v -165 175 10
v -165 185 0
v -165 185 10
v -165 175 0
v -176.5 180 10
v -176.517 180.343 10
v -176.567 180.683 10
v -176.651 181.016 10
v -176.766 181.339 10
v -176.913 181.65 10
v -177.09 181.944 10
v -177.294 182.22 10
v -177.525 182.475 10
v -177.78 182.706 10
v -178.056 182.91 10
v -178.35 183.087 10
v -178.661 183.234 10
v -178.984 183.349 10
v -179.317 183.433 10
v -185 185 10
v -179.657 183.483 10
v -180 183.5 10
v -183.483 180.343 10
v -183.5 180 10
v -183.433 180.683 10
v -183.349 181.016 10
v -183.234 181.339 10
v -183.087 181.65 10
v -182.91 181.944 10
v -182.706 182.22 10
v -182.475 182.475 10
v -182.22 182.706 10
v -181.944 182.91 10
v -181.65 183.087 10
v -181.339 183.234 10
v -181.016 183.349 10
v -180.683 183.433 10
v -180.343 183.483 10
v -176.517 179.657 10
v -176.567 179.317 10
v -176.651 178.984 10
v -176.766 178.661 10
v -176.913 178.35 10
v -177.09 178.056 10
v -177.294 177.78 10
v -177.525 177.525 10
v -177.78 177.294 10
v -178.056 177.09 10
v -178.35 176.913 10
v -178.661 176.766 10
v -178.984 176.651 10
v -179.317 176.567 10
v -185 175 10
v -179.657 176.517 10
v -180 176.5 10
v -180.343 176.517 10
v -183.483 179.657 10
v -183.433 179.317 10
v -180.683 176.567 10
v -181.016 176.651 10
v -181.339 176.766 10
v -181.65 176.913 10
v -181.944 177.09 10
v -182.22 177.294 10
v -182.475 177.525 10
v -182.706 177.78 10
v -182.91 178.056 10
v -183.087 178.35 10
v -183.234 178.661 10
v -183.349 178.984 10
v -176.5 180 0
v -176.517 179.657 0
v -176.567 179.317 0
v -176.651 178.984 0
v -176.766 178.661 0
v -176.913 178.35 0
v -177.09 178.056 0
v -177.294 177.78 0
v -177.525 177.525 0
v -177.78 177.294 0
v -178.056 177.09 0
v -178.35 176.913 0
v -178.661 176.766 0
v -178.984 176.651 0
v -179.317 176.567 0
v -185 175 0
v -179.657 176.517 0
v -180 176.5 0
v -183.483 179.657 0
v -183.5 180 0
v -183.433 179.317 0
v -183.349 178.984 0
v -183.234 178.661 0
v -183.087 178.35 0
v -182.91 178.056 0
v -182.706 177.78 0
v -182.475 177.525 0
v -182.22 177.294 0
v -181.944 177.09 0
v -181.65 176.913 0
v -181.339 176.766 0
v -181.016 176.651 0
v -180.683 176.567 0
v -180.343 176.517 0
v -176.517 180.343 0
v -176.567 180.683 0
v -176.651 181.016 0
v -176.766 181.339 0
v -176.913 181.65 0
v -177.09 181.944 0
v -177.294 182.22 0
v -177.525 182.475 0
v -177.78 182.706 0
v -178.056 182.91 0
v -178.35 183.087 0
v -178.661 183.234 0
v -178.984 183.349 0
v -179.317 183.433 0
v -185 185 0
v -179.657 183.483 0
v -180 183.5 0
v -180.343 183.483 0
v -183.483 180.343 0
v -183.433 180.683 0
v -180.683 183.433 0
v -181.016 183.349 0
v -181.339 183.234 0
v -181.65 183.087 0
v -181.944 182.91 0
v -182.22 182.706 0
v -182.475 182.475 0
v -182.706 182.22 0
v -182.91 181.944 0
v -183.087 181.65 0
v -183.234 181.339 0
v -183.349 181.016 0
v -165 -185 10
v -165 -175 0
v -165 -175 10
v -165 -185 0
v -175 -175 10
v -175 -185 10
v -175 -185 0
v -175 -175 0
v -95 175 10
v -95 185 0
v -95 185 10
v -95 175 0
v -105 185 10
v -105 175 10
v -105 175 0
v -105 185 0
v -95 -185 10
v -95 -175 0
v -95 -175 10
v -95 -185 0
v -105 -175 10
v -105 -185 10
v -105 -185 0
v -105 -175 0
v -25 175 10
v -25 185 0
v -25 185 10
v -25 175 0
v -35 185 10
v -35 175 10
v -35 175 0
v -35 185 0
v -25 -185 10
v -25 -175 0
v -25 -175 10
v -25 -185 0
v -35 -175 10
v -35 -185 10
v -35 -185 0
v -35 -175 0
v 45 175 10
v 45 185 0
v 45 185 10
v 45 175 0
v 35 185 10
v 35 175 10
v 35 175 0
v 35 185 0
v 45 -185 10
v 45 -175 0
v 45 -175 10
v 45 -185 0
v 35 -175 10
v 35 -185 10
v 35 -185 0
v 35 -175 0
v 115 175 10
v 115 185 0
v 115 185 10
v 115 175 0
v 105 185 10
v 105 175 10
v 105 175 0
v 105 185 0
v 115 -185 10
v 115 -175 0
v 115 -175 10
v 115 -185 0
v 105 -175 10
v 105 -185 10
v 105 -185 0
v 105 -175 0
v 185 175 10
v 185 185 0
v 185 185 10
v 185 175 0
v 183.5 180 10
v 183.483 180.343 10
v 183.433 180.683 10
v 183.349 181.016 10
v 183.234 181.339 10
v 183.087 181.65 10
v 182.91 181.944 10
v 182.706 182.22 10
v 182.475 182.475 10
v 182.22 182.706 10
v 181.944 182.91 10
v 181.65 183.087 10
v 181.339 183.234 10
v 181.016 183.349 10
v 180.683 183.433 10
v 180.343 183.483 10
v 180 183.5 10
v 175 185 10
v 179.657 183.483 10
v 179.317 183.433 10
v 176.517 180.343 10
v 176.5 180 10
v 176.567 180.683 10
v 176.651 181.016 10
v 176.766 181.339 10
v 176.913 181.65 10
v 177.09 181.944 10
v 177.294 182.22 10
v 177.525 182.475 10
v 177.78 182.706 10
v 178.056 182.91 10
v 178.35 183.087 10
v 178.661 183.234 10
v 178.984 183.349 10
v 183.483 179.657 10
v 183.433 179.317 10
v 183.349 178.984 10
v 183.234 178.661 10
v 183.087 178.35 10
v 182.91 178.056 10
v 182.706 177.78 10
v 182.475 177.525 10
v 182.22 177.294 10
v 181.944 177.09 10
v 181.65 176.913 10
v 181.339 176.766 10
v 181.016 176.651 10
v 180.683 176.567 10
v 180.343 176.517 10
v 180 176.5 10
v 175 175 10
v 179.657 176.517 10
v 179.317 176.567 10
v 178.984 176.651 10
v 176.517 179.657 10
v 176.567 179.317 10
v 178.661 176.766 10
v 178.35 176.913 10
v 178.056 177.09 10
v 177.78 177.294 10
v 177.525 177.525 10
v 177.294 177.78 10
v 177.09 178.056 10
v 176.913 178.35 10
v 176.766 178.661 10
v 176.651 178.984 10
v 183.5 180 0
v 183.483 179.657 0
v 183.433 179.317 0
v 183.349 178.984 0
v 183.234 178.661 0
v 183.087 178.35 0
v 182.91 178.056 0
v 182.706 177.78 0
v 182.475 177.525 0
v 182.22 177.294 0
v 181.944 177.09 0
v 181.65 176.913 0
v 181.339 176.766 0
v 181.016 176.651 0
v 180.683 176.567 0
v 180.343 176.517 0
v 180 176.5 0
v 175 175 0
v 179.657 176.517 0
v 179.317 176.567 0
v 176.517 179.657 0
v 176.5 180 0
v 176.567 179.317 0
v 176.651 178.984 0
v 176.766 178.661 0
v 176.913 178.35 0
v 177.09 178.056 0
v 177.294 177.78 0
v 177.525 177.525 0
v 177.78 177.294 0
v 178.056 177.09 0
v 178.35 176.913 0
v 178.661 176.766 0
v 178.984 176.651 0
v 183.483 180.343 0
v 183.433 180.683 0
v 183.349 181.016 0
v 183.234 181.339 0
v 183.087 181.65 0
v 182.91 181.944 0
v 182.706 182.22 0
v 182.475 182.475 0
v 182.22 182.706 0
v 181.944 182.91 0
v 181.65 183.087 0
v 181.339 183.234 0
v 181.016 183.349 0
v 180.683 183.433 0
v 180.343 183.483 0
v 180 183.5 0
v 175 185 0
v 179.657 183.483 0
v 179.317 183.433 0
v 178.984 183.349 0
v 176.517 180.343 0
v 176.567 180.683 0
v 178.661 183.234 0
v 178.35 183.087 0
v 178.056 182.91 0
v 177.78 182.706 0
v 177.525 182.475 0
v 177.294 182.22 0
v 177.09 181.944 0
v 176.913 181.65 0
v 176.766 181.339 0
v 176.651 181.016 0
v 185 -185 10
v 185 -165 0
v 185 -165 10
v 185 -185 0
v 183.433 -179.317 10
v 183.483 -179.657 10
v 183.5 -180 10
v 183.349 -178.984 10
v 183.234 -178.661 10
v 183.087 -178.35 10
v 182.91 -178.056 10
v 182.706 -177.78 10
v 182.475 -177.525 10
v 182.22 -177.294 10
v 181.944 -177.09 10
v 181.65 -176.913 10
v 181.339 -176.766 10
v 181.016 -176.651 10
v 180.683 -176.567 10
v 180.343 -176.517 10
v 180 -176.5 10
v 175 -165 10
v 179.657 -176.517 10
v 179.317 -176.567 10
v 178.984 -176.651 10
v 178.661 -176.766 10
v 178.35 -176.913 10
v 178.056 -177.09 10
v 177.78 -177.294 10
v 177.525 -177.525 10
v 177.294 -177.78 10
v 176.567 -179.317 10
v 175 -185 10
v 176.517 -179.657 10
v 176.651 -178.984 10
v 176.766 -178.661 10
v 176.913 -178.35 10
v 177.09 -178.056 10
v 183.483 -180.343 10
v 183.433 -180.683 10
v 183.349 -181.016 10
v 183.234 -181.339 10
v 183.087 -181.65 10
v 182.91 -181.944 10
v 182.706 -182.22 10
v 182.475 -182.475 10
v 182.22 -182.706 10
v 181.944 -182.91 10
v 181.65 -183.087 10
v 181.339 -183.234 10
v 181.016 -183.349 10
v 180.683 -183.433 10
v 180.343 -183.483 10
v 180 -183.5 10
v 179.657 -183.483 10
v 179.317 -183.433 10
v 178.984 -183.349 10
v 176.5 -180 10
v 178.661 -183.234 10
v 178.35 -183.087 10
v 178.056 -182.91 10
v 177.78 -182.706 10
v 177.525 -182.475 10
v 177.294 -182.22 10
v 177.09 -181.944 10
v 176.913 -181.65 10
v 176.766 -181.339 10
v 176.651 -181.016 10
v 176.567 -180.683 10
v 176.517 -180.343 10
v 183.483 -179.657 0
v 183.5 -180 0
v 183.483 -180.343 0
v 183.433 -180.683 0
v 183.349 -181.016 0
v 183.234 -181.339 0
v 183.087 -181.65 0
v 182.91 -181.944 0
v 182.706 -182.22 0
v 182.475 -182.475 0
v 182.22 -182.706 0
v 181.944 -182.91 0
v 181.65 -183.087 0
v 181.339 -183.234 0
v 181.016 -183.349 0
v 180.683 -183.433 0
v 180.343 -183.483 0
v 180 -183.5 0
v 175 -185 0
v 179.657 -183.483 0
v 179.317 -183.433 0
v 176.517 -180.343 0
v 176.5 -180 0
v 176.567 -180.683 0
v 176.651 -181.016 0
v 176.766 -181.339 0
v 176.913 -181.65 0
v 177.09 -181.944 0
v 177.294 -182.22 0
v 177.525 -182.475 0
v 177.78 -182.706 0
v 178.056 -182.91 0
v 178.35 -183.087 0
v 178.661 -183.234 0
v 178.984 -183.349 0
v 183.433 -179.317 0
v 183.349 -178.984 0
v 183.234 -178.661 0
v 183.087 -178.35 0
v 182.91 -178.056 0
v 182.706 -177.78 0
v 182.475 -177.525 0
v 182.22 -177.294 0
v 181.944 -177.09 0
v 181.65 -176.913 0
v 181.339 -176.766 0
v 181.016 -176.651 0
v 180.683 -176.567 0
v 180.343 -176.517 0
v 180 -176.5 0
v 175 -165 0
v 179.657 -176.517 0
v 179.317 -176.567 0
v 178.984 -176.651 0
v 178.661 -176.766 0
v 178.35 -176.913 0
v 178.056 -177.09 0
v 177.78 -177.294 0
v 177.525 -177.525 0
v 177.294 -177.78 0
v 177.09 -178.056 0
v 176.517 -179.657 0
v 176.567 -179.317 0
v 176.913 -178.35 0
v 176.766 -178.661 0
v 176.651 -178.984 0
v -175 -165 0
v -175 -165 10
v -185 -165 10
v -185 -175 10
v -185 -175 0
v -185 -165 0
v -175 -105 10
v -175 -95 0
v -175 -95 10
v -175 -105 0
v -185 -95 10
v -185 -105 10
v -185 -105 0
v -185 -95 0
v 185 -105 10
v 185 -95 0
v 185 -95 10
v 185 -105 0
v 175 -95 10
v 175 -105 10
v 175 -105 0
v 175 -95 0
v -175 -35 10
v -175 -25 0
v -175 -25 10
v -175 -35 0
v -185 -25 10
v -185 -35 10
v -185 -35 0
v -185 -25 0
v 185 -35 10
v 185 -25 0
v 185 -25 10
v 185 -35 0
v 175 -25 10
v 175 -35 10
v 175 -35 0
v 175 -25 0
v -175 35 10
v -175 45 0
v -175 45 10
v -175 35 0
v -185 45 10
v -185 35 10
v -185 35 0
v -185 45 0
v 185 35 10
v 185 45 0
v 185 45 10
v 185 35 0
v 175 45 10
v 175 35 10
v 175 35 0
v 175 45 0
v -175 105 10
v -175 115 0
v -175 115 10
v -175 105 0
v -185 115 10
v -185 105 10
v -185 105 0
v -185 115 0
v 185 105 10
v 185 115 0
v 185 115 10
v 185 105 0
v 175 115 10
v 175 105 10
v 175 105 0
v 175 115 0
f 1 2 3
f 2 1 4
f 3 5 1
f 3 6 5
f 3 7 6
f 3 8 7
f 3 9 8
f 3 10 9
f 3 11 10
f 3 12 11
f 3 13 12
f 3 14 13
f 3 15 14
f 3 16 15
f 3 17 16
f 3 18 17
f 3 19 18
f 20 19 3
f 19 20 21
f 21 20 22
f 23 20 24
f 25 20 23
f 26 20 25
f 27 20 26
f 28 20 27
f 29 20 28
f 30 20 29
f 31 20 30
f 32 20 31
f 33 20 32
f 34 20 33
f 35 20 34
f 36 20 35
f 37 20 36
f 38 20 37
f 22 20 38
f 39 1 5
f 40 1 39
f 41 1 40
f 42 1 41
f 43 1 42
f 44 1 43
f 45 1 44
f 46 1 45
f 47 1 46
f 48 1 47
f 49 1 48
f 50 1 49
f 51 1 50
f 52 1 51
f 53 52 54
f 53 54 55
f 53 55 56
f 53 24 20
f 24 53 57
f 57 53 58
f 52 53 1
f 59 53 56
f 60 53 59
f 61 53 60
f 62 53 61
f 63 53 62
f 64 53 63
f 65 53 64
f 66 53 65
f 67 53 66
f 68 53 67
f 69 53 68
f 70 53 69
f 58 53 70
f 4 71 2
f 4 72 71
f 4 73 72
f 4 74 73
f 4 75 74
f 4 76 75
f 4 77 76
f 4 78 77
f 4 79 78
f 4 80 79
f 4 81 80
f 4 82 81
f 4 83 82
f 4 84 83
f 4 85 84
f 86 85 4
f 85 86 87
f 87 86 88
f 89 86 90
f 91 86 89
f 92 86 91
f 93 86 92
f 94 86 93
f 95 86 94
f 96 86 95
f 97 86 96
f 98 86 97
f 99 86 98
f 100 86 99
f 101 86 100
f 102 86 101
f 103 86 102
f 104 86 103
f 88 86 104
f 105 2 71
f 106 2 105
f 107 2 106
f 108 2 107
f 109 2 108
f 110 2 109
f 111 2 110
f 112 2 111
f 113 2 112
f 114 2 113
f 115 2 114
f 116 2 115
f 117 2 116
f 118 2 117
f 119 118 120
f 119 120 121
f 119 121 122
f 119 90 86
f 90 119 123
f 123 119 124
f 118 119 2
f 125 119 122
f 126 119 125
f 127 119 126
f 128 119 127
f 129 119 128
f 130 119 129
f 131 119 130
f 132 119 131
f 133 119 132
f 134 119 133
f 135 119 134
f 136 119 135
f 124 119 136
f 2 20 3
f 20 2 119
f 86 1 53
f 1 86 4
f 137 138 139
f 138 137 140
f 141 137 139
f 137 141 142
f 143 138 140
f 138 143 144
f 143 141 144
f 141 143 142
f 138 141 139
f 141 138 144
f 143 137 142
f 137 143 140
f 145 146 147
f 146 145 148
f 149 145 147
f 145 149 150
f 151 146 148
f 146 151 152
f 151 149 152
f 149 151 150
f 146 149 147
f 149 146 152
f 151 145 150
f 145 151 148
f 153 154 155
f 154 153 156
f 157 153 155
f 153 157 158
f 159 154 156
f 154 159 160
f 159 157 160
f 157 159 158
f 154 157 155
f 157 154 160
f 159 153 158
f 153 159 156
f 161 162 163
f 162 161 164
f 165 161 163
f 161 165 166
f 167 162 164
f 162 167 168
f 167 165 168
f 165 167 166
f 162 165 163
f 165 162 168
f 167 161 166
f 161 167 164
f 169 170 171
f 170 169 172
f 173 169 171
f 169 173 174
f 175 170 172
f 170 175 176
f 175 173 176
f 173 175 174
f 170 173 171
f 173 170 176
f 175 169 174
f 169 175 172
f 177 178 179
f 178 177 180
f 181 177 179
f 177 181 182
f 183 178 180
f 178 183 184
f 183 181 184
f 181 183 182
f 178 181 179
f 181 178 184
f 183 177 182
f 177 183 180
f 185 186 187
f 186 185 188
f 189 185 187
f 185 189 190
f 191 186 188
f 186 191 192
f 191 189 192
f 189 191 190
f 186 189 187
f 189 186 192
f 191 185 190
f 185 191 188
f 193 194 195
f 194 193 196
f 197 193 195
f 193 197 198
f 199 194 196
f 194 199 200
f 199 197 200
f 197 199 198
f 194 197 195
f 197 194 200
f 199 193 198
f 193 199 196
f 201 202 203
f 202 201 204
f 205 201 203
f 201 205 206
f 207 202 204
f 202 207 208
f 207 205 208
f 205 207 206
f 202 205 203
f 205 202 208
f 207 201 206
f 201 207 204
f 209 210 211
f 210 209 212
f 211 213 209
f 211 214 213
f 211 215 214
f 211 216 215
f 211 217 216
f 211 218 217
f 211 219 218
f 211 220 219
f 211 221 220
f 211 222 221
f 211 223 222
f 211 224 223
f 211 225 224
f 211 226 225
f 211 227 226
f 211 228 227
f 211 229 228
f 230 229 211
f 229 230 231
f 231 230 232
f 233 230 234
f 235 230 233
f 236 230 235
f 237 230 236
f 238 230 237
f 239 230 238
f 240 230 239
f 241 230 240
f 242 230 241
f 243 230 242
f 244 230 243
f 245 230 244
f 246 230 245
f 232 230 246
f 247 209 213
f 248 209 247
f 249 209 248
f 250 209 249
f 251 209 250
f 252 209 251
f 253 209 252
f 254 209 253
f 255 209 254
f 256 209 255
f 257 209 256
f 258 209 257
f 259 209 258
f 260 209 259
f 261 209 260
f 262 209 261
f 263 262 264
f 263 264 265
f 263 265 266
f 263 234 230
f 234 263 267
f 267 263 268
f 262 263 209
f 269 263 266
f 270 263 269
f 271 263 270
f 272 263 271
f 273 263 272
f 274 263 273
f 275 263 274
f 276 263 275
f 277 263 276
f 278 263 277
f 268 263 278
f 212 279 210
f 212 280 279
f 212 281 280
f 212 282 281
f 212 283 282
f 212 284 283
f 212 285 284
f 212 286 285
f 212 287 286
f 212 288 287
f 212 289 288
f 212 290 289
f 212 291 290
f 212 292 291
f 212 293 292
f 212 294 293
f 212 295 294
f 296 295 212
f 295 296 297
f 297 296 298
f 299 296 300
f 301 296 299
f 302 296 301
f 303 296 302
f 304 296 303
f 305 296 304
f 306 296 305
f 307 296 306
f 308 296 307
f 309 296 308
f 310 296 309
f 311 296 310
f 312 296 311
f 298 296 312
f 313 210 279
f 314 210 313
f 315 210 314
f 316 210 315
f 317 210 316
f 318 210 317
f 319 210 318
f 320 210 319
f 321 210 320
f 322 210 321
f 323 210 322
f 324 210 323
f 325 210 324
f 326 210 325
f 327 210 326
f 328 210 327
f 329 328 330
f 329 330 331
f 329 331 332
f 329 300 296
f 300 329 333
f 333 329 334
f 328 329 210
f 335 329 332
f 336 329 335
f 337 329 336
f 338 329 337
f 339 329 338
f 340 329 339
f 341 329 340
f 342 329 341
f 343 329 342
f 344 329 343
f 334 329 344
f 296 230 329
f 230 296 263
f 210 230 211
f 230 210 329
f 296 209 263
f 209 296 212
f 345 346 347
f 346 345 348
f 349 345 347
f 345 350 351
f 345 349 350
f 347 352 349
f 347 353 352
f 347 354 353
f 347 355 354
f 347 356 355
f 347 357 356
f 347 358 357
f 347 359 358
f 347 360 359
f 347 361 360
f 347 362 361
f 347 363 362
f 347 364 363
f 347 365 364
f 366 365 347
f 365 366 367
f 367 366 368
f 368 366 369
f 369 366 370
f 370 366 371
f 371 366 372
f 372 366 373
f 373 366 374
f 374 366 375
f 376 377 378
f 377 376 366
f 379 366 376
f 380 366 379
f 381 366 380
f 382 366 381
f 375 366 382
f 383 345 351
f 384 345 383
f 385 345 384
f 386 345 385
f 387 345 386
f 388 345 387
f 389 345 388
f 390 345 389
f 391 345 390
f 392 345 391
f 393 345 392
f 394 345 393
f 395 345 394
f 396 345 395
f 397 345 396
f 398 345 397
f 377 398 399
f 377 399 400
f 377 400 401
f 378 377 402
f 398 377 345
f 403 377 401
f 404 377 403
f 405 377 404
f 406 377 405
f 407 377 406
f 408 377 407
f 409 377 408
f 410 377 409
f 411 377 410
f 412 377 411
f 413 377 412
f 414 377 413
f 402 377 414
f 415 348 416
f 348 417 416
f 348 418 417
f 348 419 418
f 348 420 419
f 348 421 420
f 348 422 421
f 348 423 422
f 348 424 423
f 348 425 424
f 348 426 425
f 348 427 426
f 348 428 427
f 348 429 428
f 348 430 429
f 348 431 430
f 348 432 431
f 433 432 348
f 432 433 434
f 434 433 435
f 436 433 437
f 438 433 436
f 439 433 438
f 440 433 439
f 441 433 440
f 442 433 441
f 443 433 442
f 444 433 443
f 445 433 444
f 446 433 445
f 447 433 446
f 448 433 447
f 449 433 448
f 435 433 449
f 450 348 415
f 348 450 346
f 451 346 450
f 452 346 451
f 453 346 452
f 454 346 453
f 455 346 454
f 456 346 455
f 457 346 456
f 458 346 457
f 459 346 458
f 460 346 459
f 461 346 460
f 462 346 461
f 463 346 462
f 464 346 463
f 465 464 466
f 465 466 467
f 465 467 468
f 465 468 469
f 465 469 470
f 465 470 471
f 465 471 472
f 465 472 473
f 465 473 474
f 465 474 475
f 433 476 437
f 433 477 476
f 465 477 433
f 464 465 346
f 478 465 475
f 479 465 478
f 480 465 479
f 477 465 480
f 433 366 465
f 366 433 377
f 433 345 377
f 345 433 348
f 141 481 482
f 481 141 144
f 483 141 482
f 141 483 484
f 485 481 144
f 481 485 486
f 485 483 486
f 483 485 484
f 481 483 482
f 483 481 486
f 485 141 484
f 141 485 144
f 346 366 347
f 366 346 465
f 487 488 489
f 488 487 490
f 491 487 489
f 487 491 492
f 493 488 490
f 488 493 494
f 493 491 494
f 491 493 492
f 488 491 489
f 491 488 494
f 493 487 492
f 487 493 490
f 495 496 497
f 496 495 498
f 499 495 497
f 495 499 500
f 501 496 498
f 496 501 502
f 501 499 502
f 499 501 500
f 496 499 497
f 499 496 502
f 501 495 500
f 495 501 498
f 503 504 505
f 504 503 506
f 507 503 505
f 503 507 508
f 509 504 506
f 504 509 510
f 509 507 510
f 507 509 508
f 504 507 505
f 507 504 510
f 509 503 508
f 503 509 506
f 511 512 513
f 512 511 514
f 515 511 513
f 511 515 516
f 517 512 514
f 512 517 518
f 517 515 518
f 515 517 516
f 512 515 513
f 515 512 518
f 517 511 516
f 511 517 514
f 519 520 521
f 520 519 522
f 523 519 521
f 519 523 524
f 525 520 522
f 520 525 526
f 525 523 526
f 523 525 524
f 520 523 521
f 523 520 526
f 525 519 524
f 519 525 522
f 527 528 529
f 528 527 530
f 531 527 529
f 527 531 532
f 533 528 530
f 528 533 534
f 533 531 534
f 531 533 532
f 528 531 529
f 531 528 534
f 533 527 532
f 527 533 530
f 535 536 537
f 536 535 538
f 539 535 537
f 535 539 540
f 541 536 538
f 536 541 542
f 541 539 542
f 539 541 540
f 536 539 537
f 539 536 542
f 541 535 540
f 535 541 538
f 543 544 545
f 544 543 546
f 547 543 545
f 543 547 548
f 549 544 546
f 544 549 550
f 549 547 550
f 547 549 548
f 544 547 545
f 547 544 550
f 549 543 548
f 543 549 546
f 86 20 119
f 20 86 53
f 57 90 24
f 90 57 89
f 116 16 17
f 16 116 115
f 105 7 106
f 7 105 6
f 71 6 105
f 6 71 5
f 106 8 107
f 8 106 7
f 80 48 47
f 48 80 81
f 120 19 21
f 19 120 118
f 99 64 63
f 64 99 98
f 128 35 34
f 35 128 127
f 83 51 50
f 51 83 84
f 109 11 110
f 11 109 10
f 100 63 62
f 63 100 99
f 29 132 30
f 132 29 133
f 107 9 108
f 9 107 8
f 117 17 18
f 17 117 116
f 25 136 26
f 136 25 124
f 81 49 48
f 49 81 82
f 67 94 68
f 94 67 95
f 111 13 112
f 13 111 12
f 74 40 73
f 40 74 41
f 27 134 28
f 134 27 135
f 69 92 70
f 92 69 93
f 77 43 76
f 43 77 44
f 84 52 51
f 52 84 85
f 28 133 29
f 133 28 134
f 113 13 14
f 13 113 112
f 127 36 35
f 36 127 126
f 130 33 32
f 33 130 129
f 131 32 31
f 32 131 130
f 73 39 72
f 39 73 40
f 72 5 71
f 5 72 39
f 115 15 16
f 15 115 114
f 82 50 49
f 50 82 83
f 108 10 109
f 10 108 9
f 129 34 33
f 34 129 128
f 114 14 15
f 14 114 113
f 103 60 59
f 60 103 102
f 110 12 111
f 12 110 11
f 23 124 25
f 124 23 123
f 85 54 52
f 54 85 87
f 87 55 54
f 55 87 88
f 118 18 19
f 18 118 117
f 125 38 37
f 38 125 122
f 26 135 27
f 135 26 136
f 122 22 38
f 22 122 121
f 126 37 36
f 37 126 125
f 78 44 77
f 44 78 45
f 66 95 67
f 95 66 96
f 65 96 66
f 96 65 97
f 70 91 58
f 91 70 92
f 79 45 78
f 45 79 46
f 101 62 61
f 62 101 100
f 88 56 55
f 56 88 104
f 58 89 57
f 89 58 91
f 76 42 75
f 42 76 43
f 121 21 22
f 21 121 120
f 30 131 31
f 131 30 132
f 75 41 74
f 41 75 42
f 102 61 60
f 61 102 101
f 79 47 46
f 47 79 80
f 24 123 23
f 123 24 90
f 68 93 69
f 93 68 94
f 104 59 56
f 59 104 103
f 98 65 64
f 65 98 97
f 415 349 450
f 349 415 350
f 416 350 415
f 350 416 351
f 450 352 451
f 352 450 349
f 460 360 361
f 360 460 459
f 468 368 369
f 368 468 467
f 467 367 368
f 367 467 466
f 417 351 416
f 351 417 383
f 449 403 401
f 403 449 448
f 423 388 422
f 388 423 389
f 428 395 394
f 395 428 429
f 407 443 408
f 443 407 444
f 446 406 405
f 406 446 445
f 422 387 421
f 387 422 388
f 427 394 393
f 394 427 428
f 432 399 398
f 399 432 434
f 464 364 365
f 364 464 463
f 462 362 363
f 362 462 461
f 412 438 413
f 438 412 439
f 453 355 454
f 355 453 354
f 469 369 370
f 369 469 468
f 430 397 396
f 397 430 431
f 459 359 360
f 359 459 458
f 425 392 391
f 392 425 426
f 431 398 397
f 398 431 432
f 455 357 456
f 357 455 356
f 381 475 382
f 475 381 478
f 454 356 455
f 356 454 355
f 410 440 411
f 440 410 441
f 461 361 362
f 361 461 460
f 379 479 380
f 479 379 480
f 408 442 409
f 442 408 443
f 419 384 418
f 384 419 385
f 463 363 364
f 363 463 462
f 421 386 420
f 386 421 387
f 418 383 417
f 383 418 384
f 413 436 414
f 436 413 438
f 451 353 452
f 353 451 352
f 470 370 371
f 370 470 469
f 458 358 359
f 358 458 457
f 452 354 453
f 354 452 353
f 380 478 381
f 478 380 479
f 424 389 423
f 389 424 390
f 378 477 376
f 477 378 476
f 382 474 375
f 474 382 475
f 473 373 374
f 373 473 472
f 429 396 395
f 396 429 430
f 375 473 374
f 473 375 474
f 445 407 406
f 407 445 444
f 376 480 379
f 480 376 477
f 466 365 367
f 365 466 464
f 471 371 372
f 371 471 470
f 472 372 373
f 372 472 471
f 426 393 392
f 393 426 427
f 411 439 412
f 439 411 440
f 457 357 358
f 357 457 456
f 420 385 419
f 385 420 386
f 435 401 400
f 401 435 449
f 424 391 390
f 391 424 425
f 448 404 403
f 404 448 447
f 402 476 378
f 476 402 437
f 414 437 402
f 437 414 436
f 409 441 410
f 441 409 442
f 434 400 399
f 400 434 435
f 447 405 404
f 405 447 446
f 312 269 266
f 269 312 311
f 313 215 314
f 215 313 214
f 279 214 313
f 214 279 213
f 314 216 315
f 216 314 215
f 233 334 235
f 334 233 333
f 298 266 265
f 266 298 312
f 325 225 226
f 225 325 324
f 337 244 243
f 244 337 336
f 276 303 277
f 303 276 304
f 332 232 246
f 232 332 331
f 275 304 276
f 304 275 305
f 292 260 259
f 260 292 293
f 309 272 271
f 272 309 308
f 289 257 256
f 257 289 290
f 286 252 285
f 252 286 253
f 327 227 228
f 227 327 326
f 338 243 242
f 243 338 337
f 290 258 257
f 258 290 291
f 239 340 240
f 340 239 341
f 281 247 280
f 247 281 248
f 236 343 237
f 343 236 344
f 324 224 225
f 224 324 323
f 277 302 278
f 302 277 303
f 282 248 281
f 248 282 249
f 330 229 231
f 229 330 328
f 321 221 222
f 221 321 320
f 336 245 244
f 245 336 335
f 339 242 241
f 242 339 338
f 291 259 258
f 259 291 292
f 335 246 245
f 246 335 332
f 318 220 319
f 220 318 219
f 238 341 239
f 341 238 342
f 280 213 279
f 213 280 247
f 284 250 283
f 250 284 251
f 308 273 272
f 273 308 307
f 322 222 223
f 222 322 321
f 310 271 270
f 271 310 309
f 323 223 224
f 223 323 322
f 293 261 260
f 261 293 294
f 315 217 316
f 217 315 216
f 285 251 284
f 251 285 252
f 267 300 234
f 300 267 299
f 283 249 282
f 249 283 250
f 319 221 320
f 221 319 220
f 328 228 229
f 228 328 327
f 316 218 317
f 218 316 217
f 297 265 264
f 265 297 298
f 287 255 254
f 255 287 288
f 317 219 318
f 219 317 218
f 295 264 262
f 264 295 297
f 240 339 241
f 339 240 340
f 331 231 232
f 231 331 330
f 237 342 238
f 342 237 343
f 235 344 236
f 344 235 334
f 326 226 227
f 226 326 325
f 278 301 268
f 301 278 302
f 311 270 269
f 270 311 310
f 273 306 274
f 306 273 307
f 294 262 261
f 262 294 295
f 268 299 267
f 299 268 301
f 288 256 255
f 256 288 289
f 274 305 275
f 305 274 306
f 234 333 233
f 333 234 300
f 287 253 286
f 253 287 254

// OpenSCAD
// ring_70.scad - ring index 70 (z bottom = 700 mm)
$fn = 64; bar = 10; half_b = bar/2; outer = 370; half_outer = outer/2;
front_y = 180; back_y = -180; left_x = -180; right_x = 180;
x_centers = [-170, -100, -30, 40, 110, 180];
z_centers = [5, 85, 155, 225, 295, 365, 435, 505, 575, 645, 715]; ring_z = 700;
module place_box(cx, cy, sx, sy) { translate([cx - sx/2, cy - sy/2, 0]) cube([sx, sy, bar]); }

difference() { union() {
    for (x = x_centers) { place_box(x, front_y, bar, bar); place_box(x, back_y, bar, bar); }
    for (y = x_centers) { place_box(left_x, y, bar, bar); place_box(right_x, y, bar, bar); }
    for (zc = z_centers) if ((zc - half_b < ring_z + bar) && (zc + half_b > ring_z)) {
        translate([-half_outer, front_y - half_b, 0]) cube([outer, bar, bar]);
        translate([-half_outer, back_y - half_b, 0])  cube([outer, bar, bar]);
        translate([left_x - half_b, -half_outer, 0])  cube([bar, outer, bar]);
        translate([right_x - half_b, -half_outer, 0]) cube([bar, outer, bar]);
    }
  }
  for (cx = [-180, 180]) for (cy = [-180, 180]) translate([cx, cy, 0]) cylinder(h = bar, r = 3.5, $fn = 64);
}
